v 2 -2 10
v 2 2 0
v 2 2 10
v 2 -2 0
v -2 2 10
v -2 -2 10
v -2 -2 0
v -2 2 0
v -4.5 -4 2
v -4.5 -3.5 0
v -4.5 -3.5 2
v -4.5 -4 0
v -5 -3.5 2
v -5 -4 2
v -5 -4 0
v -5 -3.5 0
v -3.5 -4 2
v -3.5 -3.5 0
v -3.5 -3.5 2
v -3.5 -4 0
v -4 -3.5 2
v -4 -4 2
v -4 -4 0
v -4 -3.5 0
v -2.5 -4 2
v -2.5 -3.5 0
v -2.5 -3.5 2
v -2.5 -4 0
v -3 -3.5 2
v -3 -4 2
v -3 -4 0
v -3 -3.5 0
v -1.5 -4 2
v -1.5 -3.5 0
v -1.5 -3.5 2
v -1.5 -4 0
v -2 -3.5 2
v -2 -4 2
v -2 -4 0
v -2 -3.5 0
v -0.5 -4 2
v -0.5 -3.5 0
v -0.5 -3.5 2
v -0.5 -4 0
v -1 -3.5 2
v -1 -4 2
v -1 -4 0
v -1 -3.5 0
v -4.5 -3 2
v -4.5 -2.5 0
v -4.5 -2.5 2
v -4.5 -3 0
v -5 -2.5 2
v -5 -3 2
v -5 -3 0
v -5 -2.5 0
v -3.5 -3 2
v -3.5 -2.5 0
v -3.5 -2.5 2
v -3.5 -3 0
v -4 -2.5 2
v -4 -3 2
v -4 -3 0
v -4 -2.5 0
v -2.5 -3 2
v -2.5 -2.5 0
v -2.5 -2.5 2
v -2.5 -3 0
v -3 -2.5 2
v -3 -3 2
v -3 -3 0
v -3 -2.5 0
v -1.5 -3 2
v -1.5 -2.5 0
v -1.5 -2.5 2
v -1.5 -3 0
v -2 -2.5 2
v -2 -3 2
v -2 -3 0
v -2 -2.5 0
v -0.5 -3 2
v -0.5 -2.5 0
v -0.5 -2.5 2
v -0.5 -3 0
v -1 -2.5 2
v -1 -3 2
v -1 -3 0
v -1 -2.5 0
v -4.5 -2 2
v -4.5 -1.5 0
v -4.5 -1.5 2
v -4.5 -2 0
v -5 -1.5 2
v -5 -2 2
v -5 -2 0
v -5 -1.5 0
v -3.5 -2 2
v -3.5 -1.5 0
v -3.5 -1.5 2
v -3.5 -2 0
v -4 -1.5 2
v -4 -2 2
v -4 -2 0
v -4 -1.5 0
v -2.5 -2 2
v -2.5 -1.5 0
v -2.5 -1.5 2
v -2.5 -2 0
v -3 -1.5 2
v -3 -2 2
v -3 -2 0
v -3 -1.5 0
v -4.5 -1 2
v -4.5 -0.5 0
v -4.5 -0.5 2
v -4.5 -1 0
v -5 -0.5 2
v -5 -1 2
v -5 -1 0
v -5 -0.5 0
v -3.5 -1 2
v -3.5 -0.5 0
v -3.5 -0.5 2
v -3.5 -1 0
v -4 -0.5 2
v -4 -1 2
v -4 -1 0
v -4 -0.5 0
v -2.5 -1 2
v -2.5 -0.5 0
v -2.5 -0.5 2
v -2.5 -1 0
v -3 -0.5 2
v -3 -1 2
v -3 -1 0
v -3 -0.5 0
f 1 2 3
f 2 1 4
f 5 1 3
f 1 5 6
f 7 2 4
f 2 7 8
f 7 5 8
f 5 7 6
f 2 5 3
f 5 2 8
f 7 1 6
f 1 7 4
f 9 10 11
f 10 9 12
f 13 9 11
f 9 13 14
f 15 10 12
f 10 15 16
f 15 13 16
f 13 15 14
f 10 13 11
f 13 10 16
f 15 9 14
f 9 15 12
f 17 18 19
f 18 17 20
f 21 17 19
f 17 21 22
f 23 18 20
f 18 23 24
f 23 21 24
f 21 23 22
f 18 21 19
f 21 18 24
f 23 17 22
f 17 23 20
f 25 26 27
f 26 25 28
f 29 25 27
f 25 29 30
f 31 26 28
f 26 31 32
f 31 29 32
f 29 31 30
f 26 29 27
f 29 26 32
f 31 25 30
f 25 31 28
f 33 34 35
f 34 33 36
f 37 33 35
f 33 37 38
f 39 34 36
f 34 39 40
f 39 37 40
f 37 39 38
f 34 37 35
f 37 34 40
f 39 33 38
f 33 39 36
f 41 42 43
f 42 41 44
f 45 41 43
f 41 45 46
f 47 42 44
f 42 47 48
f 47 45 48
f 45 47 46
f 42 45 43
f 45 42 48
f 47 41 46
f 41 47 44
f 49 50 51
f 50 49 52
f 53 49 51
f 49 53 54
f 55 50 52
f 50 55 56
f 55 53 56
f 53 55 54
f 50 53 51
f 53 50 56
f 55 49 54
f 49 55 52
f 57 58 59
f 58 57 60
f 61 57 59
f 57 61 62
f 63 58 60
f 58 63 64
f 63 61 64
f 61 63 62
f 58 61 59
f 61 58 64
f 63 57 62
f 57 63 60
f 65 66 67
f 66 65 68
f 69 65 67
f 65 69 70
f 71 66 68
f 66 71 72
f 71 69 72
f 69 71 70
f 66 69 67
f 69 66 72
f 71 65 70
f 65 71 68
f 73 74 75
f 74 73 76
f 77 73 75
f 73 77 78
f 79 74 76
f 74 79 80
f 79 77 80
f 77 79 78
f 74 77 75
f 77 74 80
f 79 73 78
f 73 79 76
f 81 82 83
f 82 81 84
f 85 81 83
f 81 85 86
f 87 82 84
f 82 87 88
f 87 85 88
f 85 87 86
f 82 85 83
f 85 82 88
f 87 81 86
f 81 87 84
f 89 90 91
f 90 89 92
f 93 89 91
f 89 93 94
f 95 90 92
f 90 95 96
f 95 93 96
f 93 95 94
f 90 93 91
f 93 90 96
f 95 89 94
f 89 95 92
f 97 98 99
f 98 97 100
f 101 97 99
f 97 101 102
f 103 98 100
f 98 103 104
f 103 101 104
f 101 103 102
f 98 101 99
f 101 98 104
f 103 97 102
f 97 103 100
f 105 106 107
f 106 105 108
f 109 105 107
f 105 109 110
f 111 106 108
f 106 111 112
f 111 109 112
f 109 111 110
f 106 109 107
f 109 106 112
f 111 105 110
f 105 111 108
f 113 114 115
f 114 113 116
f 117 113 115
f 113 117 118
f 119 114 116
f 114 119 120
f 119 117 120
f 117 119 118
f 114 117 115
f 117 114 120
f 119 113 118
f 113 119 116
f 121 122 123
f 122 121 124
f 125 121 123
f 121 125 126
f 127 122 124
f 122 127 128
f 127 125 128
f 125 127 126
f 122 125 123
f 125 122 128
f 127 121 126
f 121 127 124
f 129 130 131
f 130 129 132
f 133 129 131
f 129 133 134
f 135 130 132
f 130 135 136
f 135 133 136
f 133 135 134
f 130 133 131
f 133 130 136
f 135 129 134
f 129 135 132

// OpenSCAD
translate([0, 0, 5]) color([0,1,0,0.9]) cube([4, 4, 10], center=true);
translate([-4.75, -3.75, 1]) color([1,0,0]) cube([0.5, 0.5, 2], center=true);
translate([-3.75, -3.75, 1]) color([1,0,0]) cube([0.5, 0.5, 2], center=true);
translate([-2.75, -3.75, 1]) color([1,0,0]) cube([0.5, 0.5, 2], center=true);
translate([-1.75, -3.75, 1]) color([1,0,0]) cube([0.5, 0.5, 2], center=true);
translate([-0.75, -3.75, 1]) color([1,0,0]) cube([0.5, 0.5, 2], center=true);
translate([-4.75, -2.75, 1]) color([1,0,0]) cube([0.5, 0.5, 2], center=true);
translate([-3.75, -2.75, 1]) color([1,0,0]) cube([0.5, 0.5, 2], center=true);
translate([-2.75, -2.75, 1]) color([1,0,0]) cube([0.5, 0.5, 2], center=true);
translate([-1.75, -2.75, 1]) color([1,0,0]) cube([0.5, 0.5, 2], center=true);
translate([-0.75, -2.75, 1]) color([1,0,0]) cube([0.5, 0.5, 2], center=true);
translate([-4.75, -1.75, 1]) color([1,0,0]) cube([0.5, 0.5, 2], center=true);
translate([-3.75, -1.75, 1]) color([1,0,0]) cube([0.5, 0.5, 2], center=true);
translate([-2.75, -1.75, 1]) color([1,0,0]) cube([0.5, 0.5, 2], center=true);
translate([-1.75, -1.75, 1]) color([1,0,0]) cube([0.5, 0.5, 2], center=true);
translate([-0.75, -1.75, 1]) color([1,0,0]) cube([0.5, 0.5, 2], center=true);
translate([-4.75, -0.75, 1]) color([1,0,0]) cube([0.5, 0.5, 2], center=true);
translate([-3.75, -0.75, 1]) color([1,0,0]) cube([0.5, 0.5, 2], center=true);
translate([-2.75, -0.75, 1]) color([1,0,0]) cube([0.5, 0.5, 2], center=true);
translate([-1.75, -0.75, 1]) color([1,0,0]) cube([0.5, 0.5, 2], center=true);
translate([-0.75, -0.75, 1]) color([1,0,0]) cube([0.5, 0.5, 2], center=true);
